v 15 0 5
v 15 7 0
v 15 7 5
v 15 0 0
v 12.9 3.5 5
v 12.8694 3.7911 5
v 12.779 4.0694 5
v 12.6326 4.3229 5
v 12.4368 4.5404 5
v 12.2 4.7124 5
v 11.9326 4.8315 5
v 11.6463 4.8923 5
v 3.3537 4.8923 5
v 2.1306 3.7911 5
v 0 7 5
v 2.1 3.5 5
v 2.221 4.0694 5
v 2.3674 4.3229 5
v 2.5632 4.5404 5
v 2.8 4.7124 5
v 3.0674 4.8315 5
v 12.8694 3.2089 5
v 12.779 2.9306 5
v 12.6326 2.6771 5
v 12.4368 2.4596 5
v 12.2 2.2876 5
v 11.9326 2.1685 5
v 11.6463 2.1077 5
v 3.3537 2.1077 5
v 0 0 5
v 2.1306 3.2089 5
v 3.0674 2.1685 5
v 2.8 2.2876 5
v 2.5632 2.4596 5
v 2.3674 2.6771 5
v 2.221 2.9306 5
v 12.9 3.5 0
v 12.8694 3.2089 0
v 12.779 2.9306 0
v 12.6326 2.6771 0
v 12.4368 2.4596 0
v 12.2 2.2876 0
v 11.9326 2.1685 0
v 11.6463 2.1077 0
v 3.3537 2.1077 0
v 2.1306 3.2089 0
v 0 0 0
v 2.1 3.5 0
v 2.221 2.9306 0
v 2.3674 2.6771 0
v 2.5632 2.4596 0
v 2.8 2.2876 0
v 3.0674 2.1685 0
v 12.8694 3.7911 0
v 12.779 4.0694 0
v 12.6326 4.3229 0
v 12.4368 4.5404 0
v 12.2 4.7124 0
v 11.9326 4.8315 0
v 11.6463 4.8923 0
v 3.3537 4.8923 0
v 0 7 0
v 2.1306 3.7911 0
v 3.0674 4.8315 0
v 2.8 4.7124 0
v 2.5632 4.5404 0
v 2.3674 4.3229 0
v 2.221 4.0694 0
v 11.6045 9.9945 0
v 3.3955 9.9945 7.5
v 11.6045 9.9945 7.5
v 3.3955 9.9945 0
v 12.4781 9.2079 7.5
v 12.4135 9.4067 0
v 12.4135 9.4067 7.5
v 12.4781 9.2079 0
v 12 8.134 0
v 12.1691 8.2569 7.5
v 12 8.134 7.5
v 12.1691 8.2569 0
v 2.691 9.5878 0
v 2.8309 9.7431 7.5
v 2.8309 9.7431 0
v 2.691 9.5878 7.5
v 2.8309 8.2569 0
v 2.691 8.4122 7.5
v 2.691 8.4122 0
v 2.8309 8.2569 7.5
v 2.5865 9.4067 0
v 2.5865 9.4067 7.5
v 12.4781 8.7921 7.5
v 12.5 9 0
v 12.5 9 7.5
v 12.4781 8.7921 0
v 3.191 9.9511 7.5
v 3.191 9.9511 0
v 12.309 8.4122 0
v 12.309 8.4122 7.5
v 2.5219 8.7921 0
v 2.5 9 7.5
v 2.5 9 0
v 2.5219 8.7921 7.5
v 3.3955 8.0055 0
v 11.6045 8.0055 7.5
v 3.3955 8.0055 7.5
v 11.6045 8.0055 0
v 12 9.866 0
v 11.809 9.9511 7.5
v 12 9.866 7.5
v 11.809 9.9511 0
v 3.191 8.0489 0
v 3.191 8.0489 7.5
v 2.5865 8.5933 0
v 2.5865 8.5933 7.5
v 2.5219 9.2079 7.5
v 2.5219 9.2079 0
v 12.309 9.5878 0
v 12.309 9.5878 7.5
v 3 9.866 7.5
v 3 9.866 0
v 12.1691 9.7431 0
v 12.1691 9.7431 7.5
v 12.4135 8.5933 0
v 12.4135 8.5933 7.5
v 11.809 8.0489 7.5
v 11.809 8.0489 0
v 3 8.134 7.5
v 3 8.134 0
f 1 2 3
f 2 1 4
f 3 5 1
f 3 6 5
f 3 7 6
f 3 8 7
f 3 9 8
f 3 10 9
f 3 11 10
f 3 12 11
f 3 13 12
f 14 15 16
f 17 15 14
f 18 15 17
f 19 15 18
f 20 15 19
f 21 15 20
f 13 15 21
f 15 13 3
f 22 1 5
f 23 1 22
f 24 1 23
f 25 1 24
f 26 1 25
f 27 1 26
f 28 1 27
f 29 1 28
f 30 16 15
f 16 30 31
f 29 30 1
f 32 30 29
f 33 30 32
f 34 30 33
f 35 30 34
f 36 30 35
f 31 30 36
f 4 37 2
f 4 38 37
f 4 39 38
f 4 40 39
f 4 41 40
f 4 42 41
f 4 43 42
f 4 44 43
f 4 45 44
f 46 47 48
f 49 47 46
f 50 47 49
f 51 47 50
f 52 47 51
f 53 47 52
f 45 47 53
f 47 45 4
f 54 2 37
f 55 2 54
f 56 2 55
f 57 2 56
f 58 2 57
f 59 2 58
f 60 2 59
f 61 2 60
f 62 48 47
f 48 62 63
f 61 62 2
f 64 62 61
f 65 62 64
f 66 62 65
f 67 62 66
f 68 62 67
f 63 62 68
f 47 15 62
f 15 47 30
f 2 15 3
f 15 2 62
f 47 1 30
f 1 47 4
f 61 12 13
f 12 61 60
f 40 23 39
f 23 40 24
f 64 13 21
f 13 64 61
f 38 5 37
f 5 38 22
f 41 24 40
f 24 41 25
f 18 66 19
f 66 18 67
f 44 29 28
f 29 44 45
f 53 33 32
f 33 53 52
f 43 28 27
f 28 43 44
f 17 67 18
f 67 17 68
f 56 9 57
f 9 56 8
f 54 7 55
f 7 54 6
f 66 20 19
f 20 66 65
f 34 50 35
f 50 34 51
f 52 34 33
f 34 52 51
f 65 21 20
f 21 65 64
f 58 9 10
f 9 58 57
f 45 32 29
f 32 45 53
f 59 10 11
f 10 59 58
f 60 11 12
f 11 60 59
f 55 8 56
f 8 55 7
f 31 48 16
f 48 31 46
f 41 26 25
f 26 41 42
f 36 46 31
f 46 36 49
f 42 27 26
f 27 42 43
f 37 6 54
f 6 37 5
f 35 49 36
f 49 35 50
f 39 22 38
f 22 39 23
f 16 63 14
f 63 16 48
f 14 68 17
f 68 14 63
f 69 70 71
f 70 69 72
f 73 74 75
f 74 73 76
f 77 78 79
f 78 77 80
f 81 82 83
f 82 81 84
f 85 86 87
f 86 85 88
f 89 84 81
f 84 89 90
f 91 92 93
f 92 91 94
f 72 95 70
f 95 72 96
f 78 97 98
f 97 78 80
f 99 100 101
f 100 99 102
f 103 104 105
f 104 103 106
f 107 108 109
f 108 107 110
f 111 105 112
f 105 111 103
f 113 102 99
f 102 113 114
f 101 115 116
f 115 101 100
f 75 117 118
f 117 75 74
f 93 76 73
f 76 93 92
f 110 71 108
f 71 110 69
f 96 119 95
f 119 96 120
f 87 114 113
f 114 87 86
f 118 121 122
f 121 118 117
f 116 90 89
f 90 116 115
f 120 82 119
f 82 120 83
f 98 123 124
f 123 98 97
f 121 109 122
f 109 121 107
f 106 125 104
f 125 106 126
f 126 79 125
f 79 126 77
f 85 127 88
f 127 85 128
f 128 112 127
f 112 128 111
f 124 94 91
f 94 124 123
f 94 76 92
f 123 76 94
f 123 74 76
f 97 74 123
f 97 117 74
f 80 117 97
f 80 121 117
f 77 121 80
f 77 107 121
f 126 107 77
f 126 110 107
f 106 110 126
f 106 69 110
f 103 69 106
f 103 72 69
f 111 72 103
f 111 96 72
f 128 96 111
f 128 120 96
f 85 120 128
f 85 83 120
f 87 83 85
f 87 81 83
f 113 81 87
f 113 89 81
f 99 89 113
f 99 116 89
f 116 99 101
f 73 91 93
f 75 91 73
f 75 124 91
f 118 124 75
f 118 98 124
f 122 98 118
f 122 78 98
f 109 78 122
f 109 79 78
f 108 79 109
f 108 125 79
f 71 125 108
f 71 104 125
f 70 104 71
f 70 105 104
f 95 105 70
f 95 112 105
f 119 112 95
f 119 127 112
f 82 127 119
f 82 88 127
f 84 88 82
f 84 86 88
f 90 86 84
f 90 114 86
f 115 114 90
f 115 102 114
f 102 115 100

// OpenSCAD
$fn = 30;

width = 2;
length = 10;
height = 5;
padding = 5;

fit_per_side = 0.4;
round_error = 0.01;

// 0.5 loose fit
// 0.4 very tight push fit
// 0.3 slam fit

difference() {
  cube([length+padding, width+padding, height]);

  translate([padding/2 + width/2, padding/2 + width/2, -round_error])
  hull() {
    cylinder(r=width/2 + fit_per_side, h=height+round_error*2);

    translate([length - width, 0, 0]) {
      cylinder(r=width/2 + fit_per_side, h=height+round_error*2);
    }
  }
}

translate([padding/2 + width/2, width+padding + width, 0])
// translate([padding/2 + width/2, padding/2 + width/2, -round_error])
hull() {
  cylinder(r=width/2, h=height*1.5);

  translate([length - width, 0, 0]) {
    cylinder(r=width/2, h=height*1.5);
  }
}
